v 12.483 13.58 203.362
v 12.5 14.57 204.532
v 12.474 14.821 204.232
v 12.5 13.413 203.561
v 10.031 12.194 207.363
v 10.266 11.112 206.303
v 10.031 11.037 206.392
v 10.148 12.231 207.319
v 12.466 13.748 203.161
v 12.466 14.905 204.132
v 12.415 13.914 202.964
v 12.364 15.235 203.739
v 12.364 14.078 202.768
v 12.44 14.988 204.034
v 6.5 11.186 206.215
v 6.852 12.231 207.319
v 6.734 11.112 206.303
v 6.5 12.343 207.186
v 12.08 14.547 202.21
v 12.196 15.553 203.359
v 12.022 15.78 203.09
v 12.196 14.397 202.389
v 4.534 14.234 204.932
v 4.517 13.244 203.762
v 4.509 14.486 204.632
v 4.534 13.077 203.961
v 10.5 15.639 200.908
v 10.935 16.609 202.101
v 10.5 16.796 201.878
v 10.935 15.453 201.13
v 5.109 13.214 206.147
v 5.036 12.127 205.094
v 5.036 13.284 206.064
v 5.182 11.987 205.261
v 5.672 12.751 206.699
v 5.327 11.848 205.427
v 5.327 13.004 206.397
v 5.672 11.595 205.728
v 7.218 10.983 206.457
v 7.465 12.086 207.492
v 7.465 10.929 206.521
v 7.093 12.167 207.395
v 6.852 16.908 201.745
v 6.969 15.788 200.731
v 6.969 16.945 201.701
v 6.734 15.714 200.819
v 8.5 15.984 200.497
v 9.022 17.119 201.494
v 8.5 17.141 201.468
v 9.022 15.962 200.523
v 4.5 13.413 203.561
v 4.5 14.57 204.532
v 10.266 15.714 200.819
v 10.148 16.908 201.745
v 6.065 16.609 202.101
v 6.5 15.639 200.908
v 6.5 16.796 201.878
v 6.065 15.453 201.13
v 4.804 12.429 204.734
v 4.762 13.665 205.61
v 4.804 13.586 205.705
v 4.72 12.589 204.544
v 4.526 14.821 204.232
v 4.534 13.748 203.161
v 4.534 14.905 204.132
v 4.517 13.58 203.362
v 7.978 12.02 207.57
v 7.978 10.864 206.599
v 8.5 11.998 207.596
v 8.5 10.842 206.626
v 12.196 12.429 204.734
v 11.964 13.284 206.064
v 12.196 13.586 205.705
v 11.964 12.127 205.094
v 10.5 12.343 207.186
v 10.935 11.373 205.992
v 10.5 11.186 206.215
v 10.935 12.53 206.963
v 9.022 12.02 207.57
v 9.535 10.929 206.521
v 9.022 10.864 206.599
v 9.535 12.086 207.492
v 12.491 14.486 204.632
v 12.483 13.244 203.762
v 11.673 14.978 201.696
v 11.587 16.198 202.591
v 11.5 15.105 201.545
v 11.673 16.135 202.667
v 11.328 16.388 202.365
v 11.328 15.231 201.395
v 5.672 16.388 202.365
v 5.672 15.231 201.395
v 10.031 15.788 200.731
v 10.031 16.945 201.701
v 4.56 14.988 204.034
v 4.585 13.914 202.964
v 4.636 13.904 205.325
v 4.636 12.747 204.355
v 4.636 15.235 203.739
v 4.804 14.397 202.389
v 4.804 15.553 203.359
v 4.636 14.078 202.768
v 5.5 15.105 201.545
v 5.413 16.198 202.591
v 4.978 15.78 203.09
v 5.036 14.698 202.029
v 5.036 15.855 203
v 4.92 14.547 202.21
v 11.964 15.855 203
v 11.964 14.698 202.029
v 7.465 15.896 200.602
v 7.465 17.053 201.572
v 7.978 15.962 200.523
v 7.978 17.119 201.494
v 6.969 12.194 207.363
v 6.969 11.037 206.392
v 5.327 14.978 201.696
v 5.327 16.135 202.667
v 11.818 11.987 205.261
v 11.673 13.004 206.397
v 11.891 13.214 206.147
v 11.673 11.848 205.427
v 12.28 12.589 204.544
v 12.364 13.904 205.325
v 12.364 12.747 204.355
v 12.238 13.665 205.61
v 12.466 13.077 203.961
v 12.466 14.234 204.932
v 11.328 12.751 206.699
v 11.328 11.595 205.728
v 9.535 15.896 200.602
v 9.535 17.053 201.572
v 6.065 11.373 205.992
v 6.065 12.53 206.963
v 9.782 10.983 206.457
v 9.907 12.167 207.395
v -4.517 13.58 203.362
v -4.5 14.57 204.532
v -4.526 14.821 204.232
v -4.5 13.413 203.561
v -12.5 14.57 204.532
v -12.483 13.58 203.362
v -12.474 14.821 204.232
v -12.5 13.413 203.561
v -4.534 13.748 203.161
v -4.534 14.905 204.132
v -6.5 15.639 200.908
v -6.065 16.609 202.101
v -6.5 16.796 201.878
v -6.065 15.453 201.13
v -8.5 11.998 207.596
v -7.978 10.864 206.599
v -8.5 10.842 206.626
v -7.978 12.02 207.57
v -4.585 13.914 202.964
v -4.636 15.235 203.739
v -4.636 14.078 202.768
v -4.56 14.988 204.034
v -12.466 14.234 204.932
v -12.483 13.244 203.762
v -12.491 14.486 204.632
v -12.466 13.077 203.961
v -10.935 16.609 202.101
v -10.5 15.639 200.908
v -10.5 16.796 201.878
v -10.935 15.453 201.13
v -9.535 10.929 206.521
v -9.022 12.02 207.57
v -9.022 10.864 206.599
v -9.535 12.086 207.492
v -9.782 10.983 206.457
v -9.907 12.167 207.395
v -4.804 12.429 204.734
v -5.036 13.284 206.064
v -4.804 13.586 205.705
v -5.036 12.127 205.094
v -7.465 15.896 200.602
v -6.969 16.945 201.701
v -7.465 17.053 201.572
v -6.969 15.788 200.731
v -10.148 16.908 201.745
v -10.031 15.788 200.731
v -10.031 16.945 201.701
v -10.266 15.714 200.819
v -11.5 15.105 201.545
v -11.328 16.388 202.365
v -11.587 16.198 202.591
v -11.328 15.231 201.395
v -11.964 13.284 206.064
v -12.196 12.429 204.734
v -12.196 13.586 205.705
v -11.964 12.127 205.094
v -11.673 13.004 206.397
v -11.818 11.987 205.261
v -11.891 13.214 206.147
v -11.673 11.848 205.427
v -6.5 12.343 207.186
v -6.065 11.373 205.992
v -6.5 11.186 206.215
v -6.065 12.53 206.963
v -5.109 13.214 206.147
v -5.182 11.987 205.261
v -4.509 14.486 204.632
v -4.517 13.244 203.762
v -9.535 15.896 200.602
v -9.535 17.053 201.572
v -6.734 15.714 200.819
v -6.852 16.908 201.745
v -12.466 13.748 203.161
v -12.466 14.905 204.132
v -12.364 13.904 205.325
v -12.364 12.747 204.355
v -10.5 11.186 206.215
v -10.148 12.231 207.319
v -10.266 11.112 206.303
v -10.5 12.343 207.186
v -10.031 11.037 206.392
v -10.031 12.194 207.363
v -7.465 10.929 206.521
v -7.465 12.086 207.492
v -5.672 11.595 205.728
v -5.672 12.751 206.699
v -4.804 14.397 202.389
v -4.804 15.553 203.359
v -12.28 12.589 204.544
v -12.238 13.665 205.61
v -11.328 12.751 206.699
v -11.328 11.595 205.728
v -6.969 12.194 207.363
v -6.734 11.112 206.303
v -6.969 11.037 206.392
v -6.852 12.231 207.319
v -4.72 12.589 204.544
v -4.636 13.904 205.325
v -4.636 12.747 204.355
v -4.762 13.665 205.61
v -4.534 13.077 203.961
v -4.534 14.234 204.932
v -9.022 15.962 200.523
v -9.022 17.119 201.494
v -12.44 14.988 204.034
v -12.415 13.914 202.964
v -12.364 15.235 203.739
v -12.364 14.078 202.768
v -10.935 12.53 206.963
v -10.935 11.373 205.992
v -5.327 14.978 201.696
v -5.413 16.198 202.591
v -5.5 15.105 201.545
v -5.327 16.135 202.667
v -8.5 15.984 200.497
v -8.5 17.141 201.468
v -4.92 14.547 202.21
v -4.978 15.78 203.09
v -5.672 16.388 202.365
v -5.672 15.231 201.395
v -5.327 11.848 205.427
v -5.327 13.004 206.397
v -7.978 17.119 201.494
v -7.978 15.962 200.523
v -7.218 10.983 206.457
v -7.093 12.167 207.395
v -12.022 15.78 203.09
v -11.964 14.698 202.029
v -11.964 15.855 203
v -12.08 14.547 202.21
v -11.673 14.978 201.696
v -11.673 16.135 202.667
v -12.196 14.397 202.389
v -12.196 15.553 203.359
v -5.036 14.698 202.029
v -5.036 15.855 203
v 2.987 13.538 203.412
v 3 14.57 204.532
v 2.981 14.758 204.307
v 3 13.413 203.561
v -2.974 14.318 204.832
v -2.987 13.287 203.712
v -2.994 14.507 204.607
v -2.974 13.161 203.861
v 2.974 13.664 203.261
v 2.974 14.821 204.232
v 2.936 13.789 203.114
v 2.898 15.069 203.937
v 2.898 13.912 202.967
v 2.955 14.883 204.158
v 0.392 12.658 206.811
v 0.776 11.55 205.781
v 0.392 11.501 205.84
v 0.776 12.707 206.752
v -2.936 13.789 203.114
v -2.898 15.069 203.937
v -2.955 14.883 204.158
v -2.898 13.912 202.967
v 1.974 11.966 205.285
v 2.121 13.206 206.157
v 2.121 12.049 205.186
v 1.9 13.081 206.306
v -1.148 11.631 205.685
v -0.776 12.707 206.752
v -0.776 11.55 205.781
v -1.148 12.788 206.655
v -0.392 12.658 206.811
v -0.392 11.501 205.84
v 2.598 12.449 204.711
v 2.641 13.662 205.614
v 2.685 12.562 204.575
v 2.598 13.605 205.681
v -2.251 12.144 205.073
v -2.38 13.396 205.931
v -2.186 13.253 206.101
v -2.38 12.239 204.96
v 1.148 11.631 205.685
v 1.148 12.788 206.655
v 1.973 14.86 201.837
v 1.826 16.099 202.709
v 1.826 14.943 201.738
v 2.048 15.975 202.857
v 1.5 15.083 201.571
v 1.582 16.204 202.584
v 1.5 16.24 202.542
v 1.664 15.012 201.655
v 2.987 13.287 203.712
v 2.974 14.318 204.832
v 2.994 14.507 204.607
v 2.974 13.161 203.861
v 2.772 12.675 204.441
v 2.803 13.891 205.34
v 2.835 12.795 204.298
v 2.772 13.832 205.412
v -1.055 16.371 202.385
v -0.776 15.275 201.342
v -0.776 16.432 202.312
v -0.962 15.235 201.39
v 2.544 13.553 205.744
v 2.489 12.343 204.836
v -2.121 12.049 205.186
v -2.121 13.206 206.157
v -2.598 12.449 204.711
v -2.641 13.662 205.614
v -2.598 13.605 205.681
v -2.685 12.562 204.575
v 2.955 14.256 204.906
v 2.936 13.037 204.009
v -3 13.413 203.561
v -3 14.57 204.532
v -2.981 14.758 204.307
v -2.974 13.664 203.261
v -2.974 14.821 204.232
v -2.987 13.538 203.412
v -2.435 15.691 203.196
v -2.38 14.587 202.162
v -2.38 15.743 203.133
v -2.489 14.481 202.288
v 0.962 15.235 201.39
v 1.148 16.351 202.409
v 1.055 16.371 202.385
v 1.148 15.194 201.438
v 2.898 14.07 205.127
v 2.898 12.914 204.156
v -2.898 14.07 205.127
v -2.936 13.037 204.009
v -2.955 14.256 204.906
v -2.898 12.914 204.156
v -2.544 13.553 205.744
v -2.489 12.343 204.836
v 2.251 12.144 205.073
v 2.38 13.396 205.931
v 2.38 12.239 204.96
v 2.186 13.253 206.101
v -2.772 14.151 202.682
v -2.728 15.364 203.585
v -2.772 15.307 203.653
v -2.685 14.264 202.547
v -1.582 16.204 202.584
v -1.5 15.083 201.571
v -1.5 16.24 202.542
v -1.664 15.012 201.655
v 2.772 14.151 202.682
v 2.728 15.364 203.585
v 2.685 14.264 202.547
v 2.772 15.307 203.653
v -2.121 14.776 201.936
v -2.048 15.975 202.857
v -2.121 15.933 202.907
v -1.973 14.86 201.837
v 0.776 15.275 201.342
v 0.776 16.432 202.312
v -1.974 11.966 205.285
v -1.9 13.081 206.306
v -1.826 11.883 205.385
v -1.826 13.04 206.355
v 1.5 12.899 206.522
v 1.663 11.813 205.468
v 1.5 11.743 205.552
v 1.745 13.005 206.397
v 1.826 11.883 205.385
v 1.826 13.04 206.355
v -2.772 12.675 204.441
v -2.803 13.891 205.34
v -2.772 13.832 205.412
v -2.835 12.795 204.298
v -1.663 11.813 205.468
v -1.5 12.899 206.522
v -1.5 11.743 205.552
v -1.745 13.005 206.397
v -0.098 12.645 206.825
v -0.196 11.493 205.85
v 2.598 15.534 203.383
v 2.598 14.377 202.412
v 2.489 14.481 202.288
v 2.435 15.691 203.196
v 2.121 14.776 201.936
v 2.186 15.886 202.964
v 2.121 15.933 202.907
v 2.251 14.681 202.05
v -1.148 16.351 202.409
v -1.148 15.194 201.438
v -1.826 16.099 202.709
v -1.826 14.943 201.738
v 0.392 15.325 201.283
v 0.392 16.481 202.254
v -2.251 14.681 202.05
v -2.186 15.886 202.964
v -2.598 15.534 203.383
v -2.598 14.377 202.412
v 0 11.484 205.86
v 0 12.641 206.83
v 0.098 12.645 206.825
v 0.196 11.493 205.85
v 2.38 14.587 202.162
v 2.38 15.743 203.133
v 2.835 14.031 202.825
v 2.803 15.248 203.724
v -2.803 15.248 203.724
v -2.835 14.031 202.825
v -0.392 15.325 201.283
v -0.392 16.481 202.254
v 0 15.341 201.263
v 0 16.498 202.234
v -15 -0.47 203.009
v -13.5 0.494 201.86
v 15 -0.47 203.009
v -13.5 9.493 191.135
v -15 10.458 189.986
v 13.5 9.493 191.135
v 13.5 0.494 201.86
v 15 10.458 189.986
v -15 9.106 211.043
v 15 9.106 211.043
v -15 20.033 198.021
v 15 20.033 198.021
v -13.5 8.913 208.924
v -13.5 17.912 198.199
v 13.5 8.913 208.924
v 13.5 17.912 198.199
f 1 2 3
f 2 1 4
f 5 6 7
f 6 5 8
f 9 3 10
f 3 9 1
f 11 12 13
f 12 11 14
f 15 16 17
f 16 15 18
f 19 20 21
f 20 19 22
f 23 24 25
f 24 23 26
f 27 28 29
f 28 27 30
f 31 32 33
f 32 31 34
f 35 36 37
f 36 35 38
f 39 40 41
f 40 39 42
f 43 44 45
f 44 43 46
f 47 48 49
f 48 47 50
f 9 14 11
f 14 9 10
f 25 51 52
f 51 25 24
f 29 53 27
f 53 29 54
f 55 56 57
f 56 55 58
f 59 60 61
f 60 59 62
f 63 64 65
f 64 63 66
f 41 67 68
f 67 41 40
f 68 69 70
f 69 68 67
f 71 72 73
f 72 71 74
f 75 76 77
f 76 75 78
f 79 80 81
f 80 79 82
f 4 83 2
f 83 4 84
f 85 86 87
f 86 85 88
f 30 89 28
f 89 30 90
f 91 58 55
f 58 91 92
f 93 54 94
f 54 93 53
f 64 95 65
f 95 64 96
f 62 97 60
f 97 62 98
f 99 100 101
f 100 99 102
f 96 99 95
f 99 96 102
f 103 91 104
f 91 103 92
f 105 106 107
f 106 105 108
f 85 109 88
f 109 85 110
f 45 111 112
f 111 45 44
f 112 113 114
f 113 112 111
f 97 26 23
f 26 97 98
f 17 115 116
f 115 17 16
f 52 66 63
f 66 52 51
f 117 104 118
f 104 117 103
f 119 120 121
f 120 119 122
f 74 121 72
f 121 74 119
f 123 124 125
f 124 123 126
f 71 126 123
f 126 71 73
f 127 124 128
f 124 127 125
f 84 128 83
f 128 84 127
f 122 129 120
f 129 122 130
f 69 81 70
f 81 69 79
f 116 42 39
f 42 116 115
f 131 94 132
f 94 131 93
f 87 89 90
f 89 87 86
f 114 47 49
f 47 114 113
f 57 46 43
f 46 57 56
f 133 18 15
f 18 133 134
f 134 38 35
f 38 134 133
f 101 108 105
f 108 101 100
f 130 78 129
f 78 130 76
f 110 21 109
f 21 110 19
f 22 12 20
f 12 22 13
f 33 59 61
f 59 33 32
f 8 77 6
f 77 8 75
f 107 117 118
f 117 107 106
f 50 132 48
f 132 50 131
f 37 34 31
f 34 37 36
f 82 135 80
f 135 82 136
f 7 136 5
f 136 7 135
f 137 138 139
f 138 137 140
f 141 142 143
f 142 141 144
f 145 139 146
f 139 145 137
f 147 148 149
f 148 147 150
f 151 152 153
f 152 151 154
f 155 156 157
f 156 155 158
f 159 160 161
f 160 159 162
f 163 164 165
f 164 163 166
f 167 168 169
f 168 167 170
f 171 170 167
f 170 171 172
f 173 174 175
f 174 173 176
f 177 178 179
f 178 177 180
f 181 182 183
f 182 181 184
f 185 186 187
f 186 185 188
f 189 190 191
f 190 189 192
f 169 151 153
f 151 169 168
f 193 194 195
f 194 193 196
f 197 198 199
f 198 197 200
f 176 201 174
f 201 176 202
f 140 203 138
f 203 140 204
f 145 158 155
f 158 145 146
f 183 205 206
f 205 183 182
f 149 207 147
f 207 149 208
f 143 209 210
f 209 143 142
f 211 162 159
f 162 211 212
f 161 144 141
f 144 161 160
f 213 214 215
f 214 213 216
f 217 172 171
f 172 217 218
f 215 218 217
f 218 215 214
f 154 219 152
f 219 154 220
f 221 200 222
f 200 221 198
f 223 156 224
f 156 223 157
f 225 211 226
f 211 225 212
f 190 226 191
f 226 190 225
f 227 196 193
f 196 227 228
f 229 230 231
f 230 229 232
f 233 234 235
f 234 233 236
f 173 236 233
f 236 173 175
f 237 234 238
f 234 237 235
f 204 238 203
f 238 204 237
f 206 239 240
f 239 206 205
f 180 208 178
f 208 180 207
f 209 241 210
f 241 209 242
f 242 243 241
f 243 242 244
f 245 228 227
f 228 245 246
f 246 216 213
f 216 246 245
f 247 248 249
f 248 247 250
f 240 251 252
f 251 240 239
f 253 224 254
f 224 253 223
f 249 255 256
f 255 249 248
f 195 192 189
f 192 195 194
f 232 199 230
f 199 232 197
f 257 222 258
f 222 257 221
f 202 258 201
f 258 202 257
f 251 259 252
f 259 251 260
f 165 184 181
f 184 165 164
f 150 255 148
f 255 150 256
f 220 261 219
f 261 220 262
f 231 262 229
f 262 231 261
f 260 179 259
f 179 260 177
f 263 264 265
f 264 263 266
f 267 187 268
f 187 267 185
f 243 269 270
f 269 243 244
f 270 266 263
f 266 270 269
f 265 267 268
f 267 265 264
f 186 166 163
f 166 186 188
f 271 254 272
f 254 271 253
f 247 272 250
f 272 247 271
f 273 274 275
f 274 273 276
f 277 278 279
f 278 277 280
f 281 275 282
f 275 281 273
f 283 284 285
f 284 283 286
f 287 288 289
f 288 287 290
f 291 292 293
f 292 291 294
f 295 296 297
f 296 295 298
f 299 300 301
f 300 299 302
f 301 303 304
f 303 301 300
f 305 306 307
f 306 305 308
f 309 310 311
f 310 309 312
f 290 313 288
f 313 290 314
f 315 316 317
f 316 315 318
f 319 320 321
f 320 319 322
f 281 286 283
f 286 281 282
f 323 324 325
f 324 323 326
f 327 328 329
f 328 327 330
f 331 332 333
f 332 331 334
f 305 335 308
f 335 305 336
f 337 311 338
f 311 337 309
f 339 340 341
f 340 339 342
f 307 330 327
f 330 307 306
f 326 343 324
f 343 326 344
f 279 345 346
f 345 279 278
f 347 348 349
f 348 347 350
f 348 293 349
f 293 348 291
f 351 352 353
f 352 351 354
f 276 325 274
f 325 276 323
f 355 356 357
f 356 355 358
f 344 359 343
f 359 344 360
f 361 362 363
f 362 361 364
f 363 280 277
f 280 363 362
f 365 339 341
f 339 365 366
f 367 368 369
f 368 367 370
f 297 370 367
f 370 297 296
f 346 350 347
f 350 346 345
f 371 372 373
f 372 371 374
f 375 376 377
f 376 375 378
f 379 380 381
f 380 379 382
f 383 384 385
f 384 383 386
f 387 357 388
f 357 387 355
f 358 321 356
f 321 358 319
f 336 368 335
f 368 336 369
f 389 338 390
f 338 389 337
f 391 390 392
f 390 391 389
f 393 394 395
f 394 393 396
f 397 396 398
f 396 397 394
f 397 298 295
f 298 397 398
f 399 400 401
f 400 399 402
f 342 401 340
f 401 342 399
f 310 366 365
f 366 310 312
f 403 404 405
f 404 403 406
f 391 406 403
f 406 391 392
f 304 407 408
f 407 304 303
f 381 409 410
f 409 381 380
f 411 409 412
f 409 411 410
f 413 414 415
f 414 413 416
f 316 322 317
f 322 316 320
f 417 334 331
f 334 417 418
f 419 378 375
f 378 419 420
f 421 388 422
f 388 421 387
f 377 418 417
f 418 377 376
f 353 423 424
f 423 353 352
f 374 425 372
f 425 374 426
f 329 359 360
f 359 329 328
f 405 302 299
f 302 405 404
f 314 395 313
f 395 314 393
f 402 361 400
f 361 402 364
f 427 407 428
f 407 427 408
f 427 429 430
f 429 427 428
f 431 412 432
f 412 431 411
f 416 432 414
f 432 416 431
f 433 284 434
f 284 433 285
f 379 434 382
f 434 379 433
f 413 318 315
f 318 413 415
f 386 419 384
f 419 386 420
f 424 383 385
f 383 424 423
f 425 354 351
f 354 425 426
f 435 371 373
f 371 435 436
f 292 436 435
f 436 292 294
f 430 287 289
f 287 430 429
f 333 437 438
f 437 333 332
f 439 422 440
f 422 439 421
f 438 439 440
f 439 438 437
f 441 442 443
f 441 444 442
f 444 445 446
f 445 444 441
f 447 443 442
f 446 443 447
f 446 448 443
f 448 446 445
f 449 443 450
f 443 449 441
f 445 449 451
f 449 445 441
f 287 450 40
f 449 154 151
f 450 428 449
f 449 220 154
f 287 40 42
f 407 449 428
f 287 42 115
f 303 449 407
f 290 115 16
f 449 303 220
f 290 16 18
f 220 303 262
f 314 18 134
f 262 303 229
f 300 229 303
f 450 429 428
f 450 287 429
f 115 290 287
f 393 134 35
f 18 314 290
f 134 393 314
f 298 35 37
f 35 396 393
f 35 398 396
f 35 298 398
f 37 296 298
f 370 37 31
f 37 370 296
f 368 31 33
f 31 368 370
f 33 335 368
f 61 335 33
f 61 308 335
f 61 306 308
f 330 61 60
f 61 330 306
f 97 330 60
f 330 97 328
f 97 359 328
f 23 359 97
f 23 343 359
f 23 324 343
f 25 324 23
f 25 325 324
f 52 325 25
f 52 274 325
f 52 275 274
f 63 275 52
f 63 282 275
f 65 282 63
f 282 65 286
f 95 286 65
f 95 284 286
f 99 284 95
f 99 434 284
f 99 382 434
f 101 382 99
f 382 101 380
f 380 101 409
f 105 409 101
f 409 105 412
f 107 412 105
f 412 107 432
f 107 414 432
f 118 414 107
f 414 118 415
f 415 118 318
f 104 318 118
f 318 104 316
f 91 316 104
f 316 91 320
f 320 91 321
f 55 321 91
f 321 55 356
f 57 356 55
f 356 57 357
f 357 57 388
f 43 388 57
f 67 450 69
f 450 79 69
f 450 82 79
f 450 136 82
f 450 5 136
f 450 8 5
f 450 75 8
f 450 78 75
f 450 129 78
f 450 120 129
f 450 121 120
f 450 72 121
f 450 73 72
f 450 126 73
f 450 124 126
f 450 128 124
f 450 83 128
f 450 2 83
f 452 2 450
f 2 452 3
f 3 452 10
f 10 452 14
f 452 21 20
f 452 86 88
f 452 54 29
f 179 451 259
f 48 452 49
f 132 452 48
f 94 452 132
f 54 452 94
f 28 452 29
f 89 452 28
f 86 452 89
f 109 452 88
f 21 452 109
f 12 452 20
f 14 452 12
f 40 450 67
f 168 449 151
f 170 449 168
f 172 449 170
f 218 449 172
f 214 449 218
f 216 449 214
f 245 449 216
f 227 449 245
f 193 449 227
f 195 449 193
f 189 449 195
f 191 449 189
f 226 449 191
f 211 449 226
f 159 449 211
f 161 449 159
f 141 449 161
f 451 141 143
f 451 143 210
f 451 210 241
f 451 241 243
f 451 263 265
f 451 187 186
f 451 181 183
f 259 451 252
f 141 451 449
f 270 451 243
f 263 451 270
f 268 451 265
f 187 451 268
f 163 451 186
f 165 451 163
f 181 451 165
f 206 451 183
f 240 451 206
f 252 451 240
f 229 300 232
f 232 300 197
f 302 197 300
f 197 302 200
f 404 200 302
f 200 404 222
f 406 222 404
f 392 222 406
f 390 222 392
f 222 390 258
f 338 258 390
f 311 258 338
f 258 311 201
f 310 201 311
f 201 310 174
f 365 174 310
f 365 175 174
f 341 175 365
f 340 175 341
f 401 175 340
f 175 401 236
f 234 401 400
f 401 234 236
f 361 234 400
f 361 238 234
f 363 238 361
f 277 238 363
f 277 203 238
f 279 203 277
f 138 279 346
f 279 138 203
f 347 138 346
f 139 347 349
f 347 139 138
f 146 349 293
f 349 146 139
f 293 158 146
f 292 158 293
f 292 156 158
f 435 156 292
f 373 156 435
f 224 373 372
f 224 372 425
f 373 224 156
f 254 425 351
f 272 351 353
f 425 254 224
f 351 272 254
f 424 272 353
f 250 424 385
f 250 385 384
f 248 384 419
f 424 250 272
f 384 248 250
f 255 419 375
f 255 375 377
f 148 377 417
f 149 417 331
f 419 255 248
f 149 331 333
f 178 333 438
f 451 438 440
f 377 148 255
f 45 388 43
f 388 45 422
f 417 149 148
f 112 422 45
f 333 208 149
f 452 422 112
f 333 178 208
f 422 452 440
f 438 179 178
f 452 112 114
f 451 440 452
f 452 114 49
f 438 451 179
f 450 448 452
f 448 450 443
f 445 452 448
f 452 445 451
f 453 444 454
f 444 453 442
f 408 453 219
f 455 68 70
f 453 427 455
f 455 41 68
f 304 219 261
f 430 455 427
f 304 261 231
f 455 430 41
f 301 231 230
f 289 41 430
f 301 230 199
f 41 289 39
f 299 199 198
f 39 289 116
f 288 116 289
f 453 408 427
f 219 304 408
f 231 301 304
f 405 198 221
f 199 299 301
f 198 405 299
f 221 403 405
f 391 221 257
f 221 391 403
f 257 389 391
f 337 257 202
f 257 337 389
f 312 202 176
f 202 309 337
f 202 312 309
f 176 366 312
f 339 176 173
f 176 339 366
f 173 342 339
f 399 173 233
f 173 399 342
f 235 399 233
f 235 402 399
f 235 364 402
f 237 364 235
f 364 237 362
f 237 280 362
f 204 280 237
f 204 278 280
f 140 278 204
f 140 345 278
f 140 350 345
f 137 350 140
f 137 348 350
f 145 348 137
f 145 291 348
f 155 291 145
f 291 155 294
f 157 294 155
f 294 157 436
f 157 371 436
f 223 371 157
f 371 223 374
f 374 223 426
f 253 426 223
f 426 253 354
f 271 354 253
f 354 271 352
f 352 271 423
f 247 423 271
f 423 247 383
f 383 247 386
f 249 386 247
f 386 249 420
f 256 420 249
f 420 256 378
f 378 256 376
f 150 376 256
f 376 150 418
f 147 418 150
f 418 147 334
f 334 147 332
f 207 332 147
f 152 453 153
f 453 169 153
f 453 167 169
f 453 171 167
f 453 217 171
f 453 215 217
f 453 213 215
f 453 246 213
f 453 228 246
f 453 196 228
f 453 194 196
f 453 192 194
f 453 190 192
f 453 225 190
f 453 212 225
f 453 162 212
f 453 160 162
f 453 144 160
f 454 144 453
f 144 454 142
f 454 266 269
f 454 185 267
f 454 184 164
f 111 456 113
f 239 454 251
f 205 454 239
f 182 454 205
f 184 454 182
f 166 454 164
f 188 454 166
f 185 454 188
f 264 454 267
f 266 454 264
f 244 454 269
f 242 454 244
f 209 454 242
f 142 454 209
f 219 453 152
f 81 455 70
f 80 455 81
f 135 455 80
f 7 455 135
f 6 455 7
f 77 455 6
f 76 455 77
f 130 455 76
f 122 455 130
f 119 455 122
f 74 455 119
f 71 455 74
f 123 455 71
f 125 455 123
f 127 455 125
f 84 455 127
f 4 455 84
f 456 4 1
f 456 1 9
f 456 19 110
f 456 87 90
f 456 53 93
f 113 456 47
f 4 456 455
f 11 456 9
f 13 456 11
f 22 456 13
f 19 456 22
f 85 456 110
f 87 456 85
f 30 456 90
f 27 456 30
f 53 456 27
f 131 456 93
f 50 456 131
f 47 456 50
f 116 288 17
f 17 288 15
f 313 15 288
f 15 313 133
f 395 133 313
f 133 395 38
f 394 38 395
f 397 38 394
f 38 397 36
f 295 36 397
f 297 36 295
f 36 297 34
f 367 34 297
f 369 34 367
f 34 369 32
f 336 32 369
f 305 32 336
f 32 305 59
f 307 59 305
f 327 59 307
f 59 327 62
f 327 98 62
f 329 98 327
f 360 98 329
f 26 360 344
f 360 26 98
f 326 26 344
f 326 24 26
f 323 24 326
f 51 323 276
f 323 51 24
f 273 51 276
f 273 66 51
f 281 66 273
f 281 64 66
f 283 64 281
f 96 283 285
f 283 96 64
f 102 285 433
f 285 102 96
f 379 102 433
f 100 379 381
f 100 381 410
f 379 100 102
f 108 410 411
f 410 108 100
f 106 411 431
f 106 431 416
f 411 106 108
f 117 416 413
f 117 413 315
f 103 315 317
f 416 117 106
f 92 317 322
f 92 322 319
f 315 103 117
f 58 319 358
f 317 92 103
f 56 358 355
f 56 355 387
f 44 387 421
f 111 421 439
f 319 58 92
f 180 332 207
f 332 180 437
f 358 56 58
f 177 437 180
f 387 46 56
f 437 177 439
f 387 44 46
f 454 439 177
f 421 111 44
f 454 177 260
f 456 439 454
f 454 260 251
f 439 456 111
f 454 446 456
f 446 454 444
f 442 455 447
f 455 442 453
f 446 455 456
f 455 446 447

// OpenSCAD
// file: head_layout_params.scad
// head_layout_params.scad -- GENERATED by tools/head_layout_fit.py --write-scad.
// Do not edit: change tools/head_layout_fit.py and regenerate.
// Aircraft datum R2 (mm); X = +port, Y = +aft, Z = +dorsal.
BAND_W = 40.0000;
BAND_H = 36.5000;
BAND_ZC = 187.0000;
BAND_Z0 = 168.7500;
BAND_Z1 = 205.2500;
STOP_Y = 196.0000;
SLED_FLOOR_T = 1.0000;
SLED_LIP = 2.0000;
CELL_L = 116.0000;
CELL_W = 38.5000;
CELL_H = 34.0000;
CELL_Y0 = 198.0000;
CELL_Y1 = 314.0000;
RAIL_T = 2.4000;
RAIL_LIP = 4.0000;
RAIL_Y0 = 192.0000;
RAIL_HEAD_Y1 = 243.0000;
CATCH_L = 40.0000;
CATCH_W = 20.0000;
CATCH_T = 1.6000;
CATCH_TOOTH_H = 2.5000;
SADDLE_T = 3.0000;
BAND_Y1 = 402.2000;
OBS_Y0 = 49.0000;
OBS_L = 69.8500;
BAYA_Y0 = 118.0000;
BAYA_Z0 = 189.0000;
BAYA_X_IN = 1.0000;
OBS_W_FWD = 25.4000;
OBS_W_AFT = 54.0000;
OBS_BOARD_Z0 = 219.0000;
OBS_STANDOFF_D = 6.0000;
SADDLE_Y = [200.0000, 218.0000];
OBS_HOLES = [[4.00, 4.00], [65.85, 4.00], [4.00, 21.40], [65.85, 21.40]];
BAY_N = [0.000000, -0.766044, -0.642788];  // outward bay axis (40 deg bow-flat normal)
BAY_BN = [0.000000, 0.642788, -0.766044];  // board normal
BAY_FACE = [0.000000, 13.420444, 203.567876];  // window-face centre (CL)
OBS_LEAD = [0.000000, 27.975289, 215.780841];  // board leading edge
BAY_FACE_DEPTH = 10.0000;
POD_W = 10.0000;
POD_T = 14.0000;
POD_D = 18.0000;
POD_XC = 8.5000;
LASER_D = 6.0000;
LASER_L = 18.0000;
BAY_WALL = 1.5000;
BAY_INSERT_L = 11.0000;
JOINT = 1.0000;
OBS_UPPER = 2.0000;
OBS_LOWER_FWD = 2.0000;
OBS_SOM_U0 = 20.0000;
OBS_BELOW = 11.0000;
CAM_FOV_DEG = 54.0000;
OBS_OUTLINE = [[13.50, 0.00], [16.50, 6.00], [20.00, 12.00], [23.00, 18.00], [23.00, 20.00], [23.00, 58.00], [21.00, 60.00], [19.00, 62.00], [12.00, 64.00], [-12.00, 64.00], [-19.00, 62.00], [-21.00, 60.00], [-23.00, 58.00], [-23.00, 20.00], [-23.00, 18.00], [-20.00, 12.00], [-16.50, 6.00], [-13.50, 0.00]];
// file: ../hull_datums.scad
// hull_datums.scad -- GENERATED by tools/hull_datums.py --write-scad.
// Do not edit: change tools/hull_datums.py and regenerate.
// Aircraft datum R2: origin centreline / nose tip / ground plane on the
// 3.0 in gear; X = +port, Y = +aft, Z = +dorsal (mm).
X_CL = 0.0000;
Y_NOSE = 0.0000;
GROUND_Z_3IN = 0.0000;
BELLY_Z = 80.0000;
WING_LE_ROOT_Y = 311.4000;
SPAR_Y = 339.4000;
SPAR_Z = 146.8510;
SHAFT_Y = 365.0000;
CARGO_BAY_Y_FWD = 304.7000;
CARGO_BAY_Y_AFT = 410.7000;
// main file
// ============================================================
// bow_sensor_pod.scad -- Rev H2 (2026-10-27), AIRCRAFT DATUM R2
//
// Nose sensor bay for the Serenity 24 in hull: a recessed TWIN-POD bay under
// the nose brow, matching the canon arrangement (owner-approved 2026-10-27):
//   * REF-CAD-002 Nick Henning, close-bridge render: two identical rectangular
//     pods side by side in a recessed, vented bay under the brow;
//   * REF-CAD-003 QMx Official Serenity Blueprints, Sheet 3 Bow Elevation: two
//     bow fixtures either side of the centreline below the bridge window.
// Layout: camera pod PORT (+X), ToF pod STARBOARD (-X), laser exit on the CL
// in the web between them.  All three are SOLDERED TO THE LEADING EDGE of the
// Observer board (owner 2026-10-27), so the board is pitched along the bay
// axis BAY_N (the 40 deg bow-flat normal) and its outline is the traced
// inner-wall outline OBS_OUTLINE.
//
// SUPERSEDES Rev R1c (the three overlapping pockets cut on the bow flat in the
// legacy part-local frame) and bow_sensor_faceplate.scad (the bay insert's
// window face replaces the faceplate).  The old pockets lie inside BAY cut.
//
// Coordinates: aircraft datum R2 (X = +port, Y = +aft, Z = +dorsal, origin
// centreline / nose tip / ground on the 3.0 in gear) -- tools/hull_datums.py.
// Every number comes from the GENERATED include head_layout_params.scad,
// written by tools/head_layout_fit.py (single source; the same file gates the
// layout against the published shell).  Nothing below is typed twice.
//
// ToF: Broadcom AFBR-S50LX85D (12.4 x 7.6 x 7.9 mm, optics on the top face)
//   on a right-angle carrier -- recommended, pending REFERENCES.md entry
//   (official datasheet docs.broadcom.com/doc/AFBR-S50LX85D-DS).  TFmini-S
//   [REF-SENSOR-002] REJECTED: maker PRC-domiciled (AGENTS.md §5).
// Camera: NOT selected -- requirement: full-cone FoV <= CAM_FOV_DEG (54 deg is
//   the widest the bay passes unobstructed) and body within POD_W x POD_T.
// Laser: 520 nm source per docs/OBSERVER_LASER_ANALYSIS.md, Class 2 at both
//   sites [REF-IEC-002, REF-FDA-001]; module within LASER_D x LASER_L.
//
// Author: Steve Griffing, PE(CSE), CISSP-ISSEP, CPP
//         (Rev H2 geometry authored by Claude Opus 5.5, Anthropic, 2026-10-27)
// License: CERN-OHL-W-2.0 -- see LICENSES/CERN-OHL-W 2.0 (SPDX-License-Identifier: CERN-OHL-W-2.0)
// ============================================================

include <../hull_datums.scad>
include <head_layout_params.scad>

$fn = 48;

// Frame placing local (x lateral, y board-normal, z outward axis) at point c.
module bay_frame(c) {
    multmatrix([[1, BAY_BN[0], BAY_N[0], c[0]],
                [0, BAY_BN[1], BAY_N[1], c[1]],
                [0, BAY_BN[2], BAY_N[2], c[2]],
                [0, 0, 0, 1]]) children();
}

function edge_w() = 2 * (POD_XC + POD_W / 2);

// ----------------------------------------------------------------------------
// bay_cutter(): material removed from the published head (forward of the
// window face, out through the nose).  Applied by
// airframe/blender-scripts/merge_head_sensor_bay.py.
// ----------------------------------------------------------------------------
module bay_cutter() {
    bay_frame(BAY_FACE + BAY_N * 15)
        cube([edge_w() + 2 * BAY_WALL, POD_T + 2 * BAY_WALL, 30], center = true);
}

// ----------------------------------------------------------------------------
// bay_insert(): printed CF-PETG liner bonded into the cut -- side walls,
// ceiling, floor and the window face (back wall) with the three apertures.
// UNTRIMMED here: the fabrication STL (head/bow_sensor_bay_insert.stl) is
// trimmed to the head's outer envelope by merge_head_sensor_bay.py so no lip
// stands proud of the outer mould line.
// ----------------------------------------------------------------------------
module bay_insert() {
    difference() {
        bay_frame(BAY_FACE + BAY_N * (BAY_INSERT_L / 2 - BAY_WALL / 2))
            cube([edge_w() + 2 * BAY_WALL, POD_T + 2 * BAY_WALL, BAY_INSERT_L + BAY_WALL],
                 center = true);
        bay_frame(BAY_FACE + BAY_N * (BAY_INSERT_L / 2 + 0.01))
            cube([edge_w(), POD_T, BAY_INSERT_L], center = true);
        for (a = [[POD_XC, POD_W - 2], [-POD_XC, POD_W - 2], [0, LASER_D]])
            bay_frame(BAY_FACE + [a[0], 0, 0])
                cylinder(h = 6, d = a[1], center = true);
    }
}

// ----------------------------------------------------------------------------
// Sensor and board envelopes (reference solids for the assembly view).
// ----------------------------------------------------------------------------
module sensor_pods() {
    for (xc = [POD_XC, -POD_XC])   // camera port, ToF stbd
        bay_frame(BAY_FACE + [xc, 0, 0] - BAY_N * (POD_D / 2))
            cube([POD_W, POD_T, POD_D], center = true);
    bay_frame(BAY_FACE - BAY_N * (LASER_L / 2))
        cylinder(h = LASER_L, d = LASER_D, center = true);
}

// Observer board on the traced outline: local x lateral, y = u aft along the
// board (-BAY_N), z = roof-side face normal (-BAY_BN).
module observer_board(thk = 1.6) {
    multmatrix([[1, -BAY_N[0], -BAY_BN[0], OBS_LEAD[0]],
                [0, -BAY_N[1], -BAY_BN[1], OBS_LEAD[1]],
                [0, -BAY_N[2], -BAY_BN[2], OBS_LEAD[2]],
                [0, 0, 0, 1]])
        linear_extrude(height = thk) polygon(OBS_OUTLINE);
}

// Standalone preview: the bay insert, pods and board in R2.
bay_insert();
%sensor_pods();
%observer_board();
